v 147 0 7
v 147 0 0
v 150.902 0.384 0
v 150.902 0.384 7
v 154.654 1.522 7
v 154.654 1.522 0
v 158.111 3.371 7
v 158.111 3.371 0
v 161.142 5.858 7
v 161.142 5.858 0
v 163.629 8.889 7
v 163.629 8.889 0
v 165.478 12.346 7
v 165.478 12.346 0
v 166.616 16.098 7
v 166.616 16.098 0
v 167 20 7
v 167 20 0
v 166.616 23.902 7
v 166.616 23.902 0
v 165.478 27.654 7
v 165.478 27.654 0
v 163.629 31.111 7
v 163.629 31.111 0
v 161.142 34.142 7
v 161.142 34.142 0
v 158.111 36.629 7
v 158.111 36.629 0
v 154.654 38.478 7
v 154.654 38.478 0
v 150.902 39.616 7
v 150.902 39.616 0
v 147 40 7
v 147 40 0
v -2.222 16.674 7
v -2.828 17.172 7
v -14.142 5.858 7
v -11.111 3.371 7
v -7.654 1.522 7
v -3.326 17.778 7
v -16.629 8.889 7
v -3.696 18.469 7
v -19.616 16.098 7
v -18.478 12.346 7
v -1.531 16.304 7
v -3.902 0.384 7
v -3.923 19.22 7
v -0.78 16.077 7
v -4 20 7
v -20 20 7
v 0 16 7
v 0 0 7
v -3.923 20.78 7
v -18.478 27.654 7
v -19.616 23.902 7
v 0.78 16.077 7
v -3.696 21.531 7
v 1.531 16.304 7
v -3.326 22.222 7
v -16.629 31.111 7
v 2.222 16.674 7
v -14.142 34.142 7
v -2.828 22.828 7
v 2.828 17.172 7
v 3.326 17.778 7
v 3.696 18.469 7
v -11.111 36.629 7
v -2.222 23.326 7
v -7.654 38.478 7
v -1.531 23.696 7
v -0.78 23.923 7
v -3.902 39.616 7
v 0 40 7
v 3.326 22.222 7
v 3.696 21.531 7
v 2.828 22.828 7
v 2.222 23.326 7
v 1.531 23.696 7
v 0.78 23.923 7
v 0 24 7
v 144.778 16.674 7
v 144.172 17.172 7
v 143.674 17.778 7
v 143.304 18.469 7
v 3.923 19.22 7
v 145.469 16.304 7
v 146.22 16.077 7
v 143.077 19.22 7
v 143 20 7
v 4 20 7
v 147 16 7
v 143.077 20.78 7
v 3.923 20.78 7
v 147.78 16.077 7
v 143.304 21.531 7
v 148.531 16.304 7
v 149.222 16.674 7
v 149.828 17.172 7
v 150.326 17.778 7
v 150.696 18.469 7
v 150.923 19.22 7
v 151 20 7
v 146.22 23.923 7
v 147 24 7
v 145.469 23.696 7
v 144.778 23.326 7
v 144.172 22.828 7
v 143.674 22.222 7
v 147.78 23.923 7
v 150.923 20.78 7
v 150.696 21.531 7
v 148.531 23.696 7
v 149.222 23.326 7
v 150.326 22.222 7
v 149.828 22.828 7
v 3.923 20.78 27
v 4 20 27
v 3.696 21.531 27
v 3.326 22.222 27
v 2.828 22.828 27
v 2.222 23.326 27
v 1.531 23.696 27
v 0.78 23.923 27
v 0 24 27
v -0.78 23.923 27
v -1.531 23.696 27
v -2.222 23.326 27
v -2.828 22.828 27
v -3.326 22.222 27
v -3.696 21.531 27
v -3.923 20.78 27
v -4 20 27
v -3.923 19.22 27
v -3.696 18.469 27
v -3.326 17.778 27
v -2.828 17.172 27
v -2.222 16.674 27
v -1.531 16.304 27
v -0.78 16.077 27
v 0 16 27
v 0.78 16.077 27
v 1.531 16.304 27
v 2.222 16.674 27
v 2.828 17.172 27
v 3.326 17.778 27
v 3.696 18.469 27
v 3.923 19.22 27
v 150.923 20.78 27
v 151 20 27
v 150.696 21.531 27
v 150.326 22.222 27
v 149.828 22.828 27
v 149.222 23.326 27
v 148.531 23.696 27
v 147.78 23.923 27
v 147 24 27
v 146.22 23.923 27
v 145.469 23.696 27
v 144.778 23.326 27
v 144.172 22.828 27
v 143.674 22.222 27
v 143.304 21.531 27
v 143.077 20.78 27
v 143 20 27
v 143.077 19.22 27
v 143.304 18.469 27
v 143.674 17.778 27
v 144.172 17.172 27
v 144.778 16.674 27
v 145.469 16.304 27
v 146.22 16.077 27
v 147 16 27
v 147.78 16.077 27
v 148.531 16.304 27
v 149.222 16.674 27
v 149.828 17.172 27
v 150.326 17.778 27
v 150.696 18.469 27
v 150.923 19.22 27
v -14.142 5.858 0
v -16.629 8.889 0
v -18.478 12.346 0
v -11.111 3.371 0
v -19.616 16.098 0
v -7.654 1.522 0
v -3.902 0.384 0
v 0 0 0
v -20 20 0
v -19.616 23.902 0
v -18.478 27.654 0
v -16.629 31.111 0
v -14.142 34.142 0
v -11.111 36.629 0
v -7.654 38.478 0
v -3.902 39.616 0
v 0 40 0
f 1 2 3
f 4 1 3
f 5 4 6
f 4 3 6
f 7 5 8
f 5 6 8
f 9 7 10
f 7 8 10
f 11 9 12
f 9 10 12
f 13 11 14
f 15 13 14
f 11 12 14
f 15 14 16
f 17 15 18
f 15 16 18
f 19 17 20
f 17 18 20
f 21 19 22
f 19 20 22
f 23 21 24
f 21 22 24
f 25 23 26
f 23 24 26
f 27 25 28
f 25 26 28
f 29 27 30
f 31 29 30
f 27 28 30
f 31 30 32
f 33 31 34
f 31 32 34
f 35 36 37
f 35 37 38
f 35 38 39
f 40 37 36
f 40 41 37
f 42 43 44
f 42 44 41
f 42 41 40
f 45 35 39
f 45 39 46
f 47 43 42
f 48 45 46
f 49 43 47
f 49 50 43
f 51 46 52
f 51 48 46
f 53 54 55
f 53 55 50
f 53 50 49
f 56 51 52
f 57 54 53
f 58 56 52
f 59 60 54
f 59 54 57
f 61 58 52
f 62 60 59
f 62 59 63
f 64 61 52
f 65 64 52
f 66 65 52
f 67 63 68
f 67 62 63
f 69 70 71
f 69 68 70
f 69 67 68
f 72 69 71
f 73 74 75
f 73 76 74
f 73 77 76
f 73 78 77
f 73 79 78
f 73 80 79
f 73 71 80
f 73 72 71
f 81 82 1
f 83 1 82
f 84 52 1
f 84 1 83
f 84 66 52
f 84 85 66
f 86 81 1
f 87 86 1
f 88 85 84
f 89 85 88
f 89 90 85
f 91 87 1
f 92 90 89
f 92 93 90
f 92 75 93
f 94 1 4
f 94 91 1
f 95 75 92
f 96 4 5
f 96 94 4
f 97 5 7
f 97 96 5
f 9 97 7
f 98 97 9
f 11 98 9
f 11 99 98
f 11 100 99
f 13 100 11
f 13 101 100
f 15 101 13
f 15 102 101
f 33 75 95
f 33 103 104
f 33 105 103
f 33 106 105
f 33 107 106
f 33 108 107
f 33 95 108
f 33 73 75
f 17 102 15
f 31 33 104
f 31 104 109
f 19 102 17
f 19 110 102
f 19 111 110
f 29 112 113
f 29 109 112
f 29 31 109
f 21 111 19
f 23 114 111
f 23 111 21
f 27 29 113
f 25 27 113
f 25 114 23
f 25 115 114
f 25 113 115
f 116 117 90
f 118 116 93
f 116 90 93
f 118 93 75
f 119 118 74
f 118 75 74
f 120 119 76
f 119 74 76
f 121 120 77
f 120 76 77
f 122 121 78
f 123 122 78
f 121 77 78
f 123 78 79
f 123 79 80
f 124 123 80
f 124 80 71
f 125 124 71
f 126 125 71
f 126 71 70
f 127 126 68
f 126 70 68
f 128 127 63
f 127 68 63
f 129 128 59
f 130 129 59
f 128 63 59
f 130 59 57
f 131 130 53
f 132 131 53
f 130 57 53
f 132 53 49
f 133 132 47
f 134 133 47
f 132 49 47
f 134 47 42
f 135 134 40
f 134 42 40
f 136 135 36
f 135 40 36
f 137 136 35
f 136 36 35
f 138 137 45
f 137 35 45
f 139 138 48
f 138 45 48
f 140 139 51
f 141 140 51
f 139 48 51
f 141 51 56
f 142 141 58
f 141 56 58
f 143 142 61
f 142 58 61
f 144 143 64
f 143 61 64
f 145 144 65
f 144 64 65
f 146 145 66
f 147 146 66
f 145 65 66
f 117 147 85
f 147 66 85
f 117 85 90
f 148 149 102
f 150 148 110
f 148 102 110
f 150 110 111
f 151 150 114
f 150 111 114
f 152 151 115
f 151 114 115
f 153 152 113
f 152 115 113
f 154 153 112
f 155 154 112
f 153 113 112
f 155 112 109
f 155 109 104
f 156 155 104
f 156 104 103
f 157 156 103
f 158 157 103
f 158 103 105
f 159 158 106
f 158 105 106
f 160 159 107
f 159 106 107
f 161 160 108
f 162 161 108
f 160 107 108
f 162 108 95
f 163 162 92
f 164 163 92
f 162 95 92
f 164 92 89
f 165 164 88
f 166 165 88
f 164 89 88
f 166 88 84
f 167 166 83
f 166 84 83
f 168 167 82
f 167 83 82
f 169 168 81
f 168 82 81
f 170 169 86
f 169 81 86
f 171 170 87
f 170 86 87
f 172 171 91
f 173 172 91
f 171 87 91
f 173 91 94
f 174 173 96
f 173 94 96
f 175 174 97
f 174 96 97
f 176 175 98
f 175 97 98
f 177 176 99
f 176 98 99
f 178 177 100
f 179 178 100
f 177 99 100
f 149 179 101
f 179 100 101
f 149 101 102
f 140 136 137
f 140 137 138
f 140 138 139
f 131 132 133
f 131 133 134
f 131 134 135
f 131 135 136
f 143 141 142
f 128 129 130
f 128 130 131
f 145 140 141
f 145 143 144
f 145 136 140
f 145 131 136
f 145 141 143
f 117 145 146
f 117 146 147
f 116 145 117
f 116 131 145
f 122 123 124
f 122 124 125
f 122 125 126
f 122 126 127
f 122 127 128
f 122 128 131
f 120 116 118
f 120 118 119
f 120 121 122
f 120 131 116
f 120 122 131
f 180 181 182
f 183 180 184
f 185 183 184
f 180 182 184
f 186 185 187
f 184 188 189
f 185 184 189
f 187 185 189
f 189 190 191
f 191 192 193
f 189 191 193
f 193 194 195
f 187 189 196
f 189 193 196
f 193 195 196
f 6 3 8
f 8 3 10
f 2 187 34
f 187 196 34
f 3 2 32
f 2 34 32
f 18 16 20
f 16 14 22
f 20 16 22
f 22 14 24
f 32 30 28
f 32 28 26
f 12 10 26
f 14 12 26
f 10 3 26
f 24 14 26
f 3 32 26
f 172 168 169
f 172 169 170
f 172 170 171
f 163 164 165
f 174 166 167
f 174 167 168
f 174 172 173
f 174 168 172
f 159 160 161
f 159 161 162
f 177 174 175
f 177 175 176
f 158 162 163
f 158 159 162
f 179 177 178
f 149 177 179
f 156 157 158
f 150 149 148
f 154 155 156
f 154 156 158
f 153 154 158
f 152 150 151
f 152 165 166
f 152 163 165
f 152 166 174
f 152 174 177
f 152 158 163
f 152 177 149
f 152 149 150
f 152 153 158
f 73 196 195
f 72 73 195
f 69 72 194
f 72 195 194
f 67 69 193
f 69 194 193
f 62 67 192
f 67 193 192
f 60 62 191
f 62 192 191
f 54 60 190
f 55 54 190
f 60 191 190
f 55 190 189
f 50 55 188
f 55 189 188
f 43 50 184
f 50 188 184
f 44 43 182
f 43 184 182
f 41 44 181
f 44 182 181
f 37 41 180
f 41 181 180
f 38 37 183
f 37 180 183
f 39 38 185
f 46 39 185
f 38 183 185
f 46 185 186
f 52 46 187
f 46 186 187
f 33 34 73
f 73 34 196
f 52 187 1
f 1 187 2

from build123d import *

# Parameters (mm, degrees)
BOSS_EXTRUDE1_DEPTH = 7
SKETCH3_R           = 4
BOSS_EXTRUDE2_DEPTH = 20
SKETCH4_R           = 4
BOSS_EXTRUDE3_DEPTH = 20


with BuildPart() as part:
    # Sketch2 → Boss-Extrude1 (new body)
    with BuildSketch(Plane.XY):
        with BuildLine():
            Line((0, 0), (147, 0))
            ThreePointArc((147, 0), (167, 20), (147, 40))
            Line((147, 40), (0, 40))
            ThreePointArc((0, 40), (-20, 20), (0, 0))
        make_face()
    extrude(amount=BOSS_EXTRUDE1_DEPTH)

    # Sketch3 → Boss-Extrude2 (add)
    with BuildSketch(Plane.XY.offset(7)):
        with Locations((147, 20)):
            Circle(SKETCH3_R)
    extrude(amount=BOSS_EXTRUDE2_DEPTH)

    # Sketch4 → Boss-Extrude3 (add)
    with BuildSketch(Plane.XY.offset(7)):
        with Locations((0, 20)):
            Circle(SKETCH4_R)
    extrude(amount=BOSS_EXTRUDE3_DEPTH)


solid = part.part
